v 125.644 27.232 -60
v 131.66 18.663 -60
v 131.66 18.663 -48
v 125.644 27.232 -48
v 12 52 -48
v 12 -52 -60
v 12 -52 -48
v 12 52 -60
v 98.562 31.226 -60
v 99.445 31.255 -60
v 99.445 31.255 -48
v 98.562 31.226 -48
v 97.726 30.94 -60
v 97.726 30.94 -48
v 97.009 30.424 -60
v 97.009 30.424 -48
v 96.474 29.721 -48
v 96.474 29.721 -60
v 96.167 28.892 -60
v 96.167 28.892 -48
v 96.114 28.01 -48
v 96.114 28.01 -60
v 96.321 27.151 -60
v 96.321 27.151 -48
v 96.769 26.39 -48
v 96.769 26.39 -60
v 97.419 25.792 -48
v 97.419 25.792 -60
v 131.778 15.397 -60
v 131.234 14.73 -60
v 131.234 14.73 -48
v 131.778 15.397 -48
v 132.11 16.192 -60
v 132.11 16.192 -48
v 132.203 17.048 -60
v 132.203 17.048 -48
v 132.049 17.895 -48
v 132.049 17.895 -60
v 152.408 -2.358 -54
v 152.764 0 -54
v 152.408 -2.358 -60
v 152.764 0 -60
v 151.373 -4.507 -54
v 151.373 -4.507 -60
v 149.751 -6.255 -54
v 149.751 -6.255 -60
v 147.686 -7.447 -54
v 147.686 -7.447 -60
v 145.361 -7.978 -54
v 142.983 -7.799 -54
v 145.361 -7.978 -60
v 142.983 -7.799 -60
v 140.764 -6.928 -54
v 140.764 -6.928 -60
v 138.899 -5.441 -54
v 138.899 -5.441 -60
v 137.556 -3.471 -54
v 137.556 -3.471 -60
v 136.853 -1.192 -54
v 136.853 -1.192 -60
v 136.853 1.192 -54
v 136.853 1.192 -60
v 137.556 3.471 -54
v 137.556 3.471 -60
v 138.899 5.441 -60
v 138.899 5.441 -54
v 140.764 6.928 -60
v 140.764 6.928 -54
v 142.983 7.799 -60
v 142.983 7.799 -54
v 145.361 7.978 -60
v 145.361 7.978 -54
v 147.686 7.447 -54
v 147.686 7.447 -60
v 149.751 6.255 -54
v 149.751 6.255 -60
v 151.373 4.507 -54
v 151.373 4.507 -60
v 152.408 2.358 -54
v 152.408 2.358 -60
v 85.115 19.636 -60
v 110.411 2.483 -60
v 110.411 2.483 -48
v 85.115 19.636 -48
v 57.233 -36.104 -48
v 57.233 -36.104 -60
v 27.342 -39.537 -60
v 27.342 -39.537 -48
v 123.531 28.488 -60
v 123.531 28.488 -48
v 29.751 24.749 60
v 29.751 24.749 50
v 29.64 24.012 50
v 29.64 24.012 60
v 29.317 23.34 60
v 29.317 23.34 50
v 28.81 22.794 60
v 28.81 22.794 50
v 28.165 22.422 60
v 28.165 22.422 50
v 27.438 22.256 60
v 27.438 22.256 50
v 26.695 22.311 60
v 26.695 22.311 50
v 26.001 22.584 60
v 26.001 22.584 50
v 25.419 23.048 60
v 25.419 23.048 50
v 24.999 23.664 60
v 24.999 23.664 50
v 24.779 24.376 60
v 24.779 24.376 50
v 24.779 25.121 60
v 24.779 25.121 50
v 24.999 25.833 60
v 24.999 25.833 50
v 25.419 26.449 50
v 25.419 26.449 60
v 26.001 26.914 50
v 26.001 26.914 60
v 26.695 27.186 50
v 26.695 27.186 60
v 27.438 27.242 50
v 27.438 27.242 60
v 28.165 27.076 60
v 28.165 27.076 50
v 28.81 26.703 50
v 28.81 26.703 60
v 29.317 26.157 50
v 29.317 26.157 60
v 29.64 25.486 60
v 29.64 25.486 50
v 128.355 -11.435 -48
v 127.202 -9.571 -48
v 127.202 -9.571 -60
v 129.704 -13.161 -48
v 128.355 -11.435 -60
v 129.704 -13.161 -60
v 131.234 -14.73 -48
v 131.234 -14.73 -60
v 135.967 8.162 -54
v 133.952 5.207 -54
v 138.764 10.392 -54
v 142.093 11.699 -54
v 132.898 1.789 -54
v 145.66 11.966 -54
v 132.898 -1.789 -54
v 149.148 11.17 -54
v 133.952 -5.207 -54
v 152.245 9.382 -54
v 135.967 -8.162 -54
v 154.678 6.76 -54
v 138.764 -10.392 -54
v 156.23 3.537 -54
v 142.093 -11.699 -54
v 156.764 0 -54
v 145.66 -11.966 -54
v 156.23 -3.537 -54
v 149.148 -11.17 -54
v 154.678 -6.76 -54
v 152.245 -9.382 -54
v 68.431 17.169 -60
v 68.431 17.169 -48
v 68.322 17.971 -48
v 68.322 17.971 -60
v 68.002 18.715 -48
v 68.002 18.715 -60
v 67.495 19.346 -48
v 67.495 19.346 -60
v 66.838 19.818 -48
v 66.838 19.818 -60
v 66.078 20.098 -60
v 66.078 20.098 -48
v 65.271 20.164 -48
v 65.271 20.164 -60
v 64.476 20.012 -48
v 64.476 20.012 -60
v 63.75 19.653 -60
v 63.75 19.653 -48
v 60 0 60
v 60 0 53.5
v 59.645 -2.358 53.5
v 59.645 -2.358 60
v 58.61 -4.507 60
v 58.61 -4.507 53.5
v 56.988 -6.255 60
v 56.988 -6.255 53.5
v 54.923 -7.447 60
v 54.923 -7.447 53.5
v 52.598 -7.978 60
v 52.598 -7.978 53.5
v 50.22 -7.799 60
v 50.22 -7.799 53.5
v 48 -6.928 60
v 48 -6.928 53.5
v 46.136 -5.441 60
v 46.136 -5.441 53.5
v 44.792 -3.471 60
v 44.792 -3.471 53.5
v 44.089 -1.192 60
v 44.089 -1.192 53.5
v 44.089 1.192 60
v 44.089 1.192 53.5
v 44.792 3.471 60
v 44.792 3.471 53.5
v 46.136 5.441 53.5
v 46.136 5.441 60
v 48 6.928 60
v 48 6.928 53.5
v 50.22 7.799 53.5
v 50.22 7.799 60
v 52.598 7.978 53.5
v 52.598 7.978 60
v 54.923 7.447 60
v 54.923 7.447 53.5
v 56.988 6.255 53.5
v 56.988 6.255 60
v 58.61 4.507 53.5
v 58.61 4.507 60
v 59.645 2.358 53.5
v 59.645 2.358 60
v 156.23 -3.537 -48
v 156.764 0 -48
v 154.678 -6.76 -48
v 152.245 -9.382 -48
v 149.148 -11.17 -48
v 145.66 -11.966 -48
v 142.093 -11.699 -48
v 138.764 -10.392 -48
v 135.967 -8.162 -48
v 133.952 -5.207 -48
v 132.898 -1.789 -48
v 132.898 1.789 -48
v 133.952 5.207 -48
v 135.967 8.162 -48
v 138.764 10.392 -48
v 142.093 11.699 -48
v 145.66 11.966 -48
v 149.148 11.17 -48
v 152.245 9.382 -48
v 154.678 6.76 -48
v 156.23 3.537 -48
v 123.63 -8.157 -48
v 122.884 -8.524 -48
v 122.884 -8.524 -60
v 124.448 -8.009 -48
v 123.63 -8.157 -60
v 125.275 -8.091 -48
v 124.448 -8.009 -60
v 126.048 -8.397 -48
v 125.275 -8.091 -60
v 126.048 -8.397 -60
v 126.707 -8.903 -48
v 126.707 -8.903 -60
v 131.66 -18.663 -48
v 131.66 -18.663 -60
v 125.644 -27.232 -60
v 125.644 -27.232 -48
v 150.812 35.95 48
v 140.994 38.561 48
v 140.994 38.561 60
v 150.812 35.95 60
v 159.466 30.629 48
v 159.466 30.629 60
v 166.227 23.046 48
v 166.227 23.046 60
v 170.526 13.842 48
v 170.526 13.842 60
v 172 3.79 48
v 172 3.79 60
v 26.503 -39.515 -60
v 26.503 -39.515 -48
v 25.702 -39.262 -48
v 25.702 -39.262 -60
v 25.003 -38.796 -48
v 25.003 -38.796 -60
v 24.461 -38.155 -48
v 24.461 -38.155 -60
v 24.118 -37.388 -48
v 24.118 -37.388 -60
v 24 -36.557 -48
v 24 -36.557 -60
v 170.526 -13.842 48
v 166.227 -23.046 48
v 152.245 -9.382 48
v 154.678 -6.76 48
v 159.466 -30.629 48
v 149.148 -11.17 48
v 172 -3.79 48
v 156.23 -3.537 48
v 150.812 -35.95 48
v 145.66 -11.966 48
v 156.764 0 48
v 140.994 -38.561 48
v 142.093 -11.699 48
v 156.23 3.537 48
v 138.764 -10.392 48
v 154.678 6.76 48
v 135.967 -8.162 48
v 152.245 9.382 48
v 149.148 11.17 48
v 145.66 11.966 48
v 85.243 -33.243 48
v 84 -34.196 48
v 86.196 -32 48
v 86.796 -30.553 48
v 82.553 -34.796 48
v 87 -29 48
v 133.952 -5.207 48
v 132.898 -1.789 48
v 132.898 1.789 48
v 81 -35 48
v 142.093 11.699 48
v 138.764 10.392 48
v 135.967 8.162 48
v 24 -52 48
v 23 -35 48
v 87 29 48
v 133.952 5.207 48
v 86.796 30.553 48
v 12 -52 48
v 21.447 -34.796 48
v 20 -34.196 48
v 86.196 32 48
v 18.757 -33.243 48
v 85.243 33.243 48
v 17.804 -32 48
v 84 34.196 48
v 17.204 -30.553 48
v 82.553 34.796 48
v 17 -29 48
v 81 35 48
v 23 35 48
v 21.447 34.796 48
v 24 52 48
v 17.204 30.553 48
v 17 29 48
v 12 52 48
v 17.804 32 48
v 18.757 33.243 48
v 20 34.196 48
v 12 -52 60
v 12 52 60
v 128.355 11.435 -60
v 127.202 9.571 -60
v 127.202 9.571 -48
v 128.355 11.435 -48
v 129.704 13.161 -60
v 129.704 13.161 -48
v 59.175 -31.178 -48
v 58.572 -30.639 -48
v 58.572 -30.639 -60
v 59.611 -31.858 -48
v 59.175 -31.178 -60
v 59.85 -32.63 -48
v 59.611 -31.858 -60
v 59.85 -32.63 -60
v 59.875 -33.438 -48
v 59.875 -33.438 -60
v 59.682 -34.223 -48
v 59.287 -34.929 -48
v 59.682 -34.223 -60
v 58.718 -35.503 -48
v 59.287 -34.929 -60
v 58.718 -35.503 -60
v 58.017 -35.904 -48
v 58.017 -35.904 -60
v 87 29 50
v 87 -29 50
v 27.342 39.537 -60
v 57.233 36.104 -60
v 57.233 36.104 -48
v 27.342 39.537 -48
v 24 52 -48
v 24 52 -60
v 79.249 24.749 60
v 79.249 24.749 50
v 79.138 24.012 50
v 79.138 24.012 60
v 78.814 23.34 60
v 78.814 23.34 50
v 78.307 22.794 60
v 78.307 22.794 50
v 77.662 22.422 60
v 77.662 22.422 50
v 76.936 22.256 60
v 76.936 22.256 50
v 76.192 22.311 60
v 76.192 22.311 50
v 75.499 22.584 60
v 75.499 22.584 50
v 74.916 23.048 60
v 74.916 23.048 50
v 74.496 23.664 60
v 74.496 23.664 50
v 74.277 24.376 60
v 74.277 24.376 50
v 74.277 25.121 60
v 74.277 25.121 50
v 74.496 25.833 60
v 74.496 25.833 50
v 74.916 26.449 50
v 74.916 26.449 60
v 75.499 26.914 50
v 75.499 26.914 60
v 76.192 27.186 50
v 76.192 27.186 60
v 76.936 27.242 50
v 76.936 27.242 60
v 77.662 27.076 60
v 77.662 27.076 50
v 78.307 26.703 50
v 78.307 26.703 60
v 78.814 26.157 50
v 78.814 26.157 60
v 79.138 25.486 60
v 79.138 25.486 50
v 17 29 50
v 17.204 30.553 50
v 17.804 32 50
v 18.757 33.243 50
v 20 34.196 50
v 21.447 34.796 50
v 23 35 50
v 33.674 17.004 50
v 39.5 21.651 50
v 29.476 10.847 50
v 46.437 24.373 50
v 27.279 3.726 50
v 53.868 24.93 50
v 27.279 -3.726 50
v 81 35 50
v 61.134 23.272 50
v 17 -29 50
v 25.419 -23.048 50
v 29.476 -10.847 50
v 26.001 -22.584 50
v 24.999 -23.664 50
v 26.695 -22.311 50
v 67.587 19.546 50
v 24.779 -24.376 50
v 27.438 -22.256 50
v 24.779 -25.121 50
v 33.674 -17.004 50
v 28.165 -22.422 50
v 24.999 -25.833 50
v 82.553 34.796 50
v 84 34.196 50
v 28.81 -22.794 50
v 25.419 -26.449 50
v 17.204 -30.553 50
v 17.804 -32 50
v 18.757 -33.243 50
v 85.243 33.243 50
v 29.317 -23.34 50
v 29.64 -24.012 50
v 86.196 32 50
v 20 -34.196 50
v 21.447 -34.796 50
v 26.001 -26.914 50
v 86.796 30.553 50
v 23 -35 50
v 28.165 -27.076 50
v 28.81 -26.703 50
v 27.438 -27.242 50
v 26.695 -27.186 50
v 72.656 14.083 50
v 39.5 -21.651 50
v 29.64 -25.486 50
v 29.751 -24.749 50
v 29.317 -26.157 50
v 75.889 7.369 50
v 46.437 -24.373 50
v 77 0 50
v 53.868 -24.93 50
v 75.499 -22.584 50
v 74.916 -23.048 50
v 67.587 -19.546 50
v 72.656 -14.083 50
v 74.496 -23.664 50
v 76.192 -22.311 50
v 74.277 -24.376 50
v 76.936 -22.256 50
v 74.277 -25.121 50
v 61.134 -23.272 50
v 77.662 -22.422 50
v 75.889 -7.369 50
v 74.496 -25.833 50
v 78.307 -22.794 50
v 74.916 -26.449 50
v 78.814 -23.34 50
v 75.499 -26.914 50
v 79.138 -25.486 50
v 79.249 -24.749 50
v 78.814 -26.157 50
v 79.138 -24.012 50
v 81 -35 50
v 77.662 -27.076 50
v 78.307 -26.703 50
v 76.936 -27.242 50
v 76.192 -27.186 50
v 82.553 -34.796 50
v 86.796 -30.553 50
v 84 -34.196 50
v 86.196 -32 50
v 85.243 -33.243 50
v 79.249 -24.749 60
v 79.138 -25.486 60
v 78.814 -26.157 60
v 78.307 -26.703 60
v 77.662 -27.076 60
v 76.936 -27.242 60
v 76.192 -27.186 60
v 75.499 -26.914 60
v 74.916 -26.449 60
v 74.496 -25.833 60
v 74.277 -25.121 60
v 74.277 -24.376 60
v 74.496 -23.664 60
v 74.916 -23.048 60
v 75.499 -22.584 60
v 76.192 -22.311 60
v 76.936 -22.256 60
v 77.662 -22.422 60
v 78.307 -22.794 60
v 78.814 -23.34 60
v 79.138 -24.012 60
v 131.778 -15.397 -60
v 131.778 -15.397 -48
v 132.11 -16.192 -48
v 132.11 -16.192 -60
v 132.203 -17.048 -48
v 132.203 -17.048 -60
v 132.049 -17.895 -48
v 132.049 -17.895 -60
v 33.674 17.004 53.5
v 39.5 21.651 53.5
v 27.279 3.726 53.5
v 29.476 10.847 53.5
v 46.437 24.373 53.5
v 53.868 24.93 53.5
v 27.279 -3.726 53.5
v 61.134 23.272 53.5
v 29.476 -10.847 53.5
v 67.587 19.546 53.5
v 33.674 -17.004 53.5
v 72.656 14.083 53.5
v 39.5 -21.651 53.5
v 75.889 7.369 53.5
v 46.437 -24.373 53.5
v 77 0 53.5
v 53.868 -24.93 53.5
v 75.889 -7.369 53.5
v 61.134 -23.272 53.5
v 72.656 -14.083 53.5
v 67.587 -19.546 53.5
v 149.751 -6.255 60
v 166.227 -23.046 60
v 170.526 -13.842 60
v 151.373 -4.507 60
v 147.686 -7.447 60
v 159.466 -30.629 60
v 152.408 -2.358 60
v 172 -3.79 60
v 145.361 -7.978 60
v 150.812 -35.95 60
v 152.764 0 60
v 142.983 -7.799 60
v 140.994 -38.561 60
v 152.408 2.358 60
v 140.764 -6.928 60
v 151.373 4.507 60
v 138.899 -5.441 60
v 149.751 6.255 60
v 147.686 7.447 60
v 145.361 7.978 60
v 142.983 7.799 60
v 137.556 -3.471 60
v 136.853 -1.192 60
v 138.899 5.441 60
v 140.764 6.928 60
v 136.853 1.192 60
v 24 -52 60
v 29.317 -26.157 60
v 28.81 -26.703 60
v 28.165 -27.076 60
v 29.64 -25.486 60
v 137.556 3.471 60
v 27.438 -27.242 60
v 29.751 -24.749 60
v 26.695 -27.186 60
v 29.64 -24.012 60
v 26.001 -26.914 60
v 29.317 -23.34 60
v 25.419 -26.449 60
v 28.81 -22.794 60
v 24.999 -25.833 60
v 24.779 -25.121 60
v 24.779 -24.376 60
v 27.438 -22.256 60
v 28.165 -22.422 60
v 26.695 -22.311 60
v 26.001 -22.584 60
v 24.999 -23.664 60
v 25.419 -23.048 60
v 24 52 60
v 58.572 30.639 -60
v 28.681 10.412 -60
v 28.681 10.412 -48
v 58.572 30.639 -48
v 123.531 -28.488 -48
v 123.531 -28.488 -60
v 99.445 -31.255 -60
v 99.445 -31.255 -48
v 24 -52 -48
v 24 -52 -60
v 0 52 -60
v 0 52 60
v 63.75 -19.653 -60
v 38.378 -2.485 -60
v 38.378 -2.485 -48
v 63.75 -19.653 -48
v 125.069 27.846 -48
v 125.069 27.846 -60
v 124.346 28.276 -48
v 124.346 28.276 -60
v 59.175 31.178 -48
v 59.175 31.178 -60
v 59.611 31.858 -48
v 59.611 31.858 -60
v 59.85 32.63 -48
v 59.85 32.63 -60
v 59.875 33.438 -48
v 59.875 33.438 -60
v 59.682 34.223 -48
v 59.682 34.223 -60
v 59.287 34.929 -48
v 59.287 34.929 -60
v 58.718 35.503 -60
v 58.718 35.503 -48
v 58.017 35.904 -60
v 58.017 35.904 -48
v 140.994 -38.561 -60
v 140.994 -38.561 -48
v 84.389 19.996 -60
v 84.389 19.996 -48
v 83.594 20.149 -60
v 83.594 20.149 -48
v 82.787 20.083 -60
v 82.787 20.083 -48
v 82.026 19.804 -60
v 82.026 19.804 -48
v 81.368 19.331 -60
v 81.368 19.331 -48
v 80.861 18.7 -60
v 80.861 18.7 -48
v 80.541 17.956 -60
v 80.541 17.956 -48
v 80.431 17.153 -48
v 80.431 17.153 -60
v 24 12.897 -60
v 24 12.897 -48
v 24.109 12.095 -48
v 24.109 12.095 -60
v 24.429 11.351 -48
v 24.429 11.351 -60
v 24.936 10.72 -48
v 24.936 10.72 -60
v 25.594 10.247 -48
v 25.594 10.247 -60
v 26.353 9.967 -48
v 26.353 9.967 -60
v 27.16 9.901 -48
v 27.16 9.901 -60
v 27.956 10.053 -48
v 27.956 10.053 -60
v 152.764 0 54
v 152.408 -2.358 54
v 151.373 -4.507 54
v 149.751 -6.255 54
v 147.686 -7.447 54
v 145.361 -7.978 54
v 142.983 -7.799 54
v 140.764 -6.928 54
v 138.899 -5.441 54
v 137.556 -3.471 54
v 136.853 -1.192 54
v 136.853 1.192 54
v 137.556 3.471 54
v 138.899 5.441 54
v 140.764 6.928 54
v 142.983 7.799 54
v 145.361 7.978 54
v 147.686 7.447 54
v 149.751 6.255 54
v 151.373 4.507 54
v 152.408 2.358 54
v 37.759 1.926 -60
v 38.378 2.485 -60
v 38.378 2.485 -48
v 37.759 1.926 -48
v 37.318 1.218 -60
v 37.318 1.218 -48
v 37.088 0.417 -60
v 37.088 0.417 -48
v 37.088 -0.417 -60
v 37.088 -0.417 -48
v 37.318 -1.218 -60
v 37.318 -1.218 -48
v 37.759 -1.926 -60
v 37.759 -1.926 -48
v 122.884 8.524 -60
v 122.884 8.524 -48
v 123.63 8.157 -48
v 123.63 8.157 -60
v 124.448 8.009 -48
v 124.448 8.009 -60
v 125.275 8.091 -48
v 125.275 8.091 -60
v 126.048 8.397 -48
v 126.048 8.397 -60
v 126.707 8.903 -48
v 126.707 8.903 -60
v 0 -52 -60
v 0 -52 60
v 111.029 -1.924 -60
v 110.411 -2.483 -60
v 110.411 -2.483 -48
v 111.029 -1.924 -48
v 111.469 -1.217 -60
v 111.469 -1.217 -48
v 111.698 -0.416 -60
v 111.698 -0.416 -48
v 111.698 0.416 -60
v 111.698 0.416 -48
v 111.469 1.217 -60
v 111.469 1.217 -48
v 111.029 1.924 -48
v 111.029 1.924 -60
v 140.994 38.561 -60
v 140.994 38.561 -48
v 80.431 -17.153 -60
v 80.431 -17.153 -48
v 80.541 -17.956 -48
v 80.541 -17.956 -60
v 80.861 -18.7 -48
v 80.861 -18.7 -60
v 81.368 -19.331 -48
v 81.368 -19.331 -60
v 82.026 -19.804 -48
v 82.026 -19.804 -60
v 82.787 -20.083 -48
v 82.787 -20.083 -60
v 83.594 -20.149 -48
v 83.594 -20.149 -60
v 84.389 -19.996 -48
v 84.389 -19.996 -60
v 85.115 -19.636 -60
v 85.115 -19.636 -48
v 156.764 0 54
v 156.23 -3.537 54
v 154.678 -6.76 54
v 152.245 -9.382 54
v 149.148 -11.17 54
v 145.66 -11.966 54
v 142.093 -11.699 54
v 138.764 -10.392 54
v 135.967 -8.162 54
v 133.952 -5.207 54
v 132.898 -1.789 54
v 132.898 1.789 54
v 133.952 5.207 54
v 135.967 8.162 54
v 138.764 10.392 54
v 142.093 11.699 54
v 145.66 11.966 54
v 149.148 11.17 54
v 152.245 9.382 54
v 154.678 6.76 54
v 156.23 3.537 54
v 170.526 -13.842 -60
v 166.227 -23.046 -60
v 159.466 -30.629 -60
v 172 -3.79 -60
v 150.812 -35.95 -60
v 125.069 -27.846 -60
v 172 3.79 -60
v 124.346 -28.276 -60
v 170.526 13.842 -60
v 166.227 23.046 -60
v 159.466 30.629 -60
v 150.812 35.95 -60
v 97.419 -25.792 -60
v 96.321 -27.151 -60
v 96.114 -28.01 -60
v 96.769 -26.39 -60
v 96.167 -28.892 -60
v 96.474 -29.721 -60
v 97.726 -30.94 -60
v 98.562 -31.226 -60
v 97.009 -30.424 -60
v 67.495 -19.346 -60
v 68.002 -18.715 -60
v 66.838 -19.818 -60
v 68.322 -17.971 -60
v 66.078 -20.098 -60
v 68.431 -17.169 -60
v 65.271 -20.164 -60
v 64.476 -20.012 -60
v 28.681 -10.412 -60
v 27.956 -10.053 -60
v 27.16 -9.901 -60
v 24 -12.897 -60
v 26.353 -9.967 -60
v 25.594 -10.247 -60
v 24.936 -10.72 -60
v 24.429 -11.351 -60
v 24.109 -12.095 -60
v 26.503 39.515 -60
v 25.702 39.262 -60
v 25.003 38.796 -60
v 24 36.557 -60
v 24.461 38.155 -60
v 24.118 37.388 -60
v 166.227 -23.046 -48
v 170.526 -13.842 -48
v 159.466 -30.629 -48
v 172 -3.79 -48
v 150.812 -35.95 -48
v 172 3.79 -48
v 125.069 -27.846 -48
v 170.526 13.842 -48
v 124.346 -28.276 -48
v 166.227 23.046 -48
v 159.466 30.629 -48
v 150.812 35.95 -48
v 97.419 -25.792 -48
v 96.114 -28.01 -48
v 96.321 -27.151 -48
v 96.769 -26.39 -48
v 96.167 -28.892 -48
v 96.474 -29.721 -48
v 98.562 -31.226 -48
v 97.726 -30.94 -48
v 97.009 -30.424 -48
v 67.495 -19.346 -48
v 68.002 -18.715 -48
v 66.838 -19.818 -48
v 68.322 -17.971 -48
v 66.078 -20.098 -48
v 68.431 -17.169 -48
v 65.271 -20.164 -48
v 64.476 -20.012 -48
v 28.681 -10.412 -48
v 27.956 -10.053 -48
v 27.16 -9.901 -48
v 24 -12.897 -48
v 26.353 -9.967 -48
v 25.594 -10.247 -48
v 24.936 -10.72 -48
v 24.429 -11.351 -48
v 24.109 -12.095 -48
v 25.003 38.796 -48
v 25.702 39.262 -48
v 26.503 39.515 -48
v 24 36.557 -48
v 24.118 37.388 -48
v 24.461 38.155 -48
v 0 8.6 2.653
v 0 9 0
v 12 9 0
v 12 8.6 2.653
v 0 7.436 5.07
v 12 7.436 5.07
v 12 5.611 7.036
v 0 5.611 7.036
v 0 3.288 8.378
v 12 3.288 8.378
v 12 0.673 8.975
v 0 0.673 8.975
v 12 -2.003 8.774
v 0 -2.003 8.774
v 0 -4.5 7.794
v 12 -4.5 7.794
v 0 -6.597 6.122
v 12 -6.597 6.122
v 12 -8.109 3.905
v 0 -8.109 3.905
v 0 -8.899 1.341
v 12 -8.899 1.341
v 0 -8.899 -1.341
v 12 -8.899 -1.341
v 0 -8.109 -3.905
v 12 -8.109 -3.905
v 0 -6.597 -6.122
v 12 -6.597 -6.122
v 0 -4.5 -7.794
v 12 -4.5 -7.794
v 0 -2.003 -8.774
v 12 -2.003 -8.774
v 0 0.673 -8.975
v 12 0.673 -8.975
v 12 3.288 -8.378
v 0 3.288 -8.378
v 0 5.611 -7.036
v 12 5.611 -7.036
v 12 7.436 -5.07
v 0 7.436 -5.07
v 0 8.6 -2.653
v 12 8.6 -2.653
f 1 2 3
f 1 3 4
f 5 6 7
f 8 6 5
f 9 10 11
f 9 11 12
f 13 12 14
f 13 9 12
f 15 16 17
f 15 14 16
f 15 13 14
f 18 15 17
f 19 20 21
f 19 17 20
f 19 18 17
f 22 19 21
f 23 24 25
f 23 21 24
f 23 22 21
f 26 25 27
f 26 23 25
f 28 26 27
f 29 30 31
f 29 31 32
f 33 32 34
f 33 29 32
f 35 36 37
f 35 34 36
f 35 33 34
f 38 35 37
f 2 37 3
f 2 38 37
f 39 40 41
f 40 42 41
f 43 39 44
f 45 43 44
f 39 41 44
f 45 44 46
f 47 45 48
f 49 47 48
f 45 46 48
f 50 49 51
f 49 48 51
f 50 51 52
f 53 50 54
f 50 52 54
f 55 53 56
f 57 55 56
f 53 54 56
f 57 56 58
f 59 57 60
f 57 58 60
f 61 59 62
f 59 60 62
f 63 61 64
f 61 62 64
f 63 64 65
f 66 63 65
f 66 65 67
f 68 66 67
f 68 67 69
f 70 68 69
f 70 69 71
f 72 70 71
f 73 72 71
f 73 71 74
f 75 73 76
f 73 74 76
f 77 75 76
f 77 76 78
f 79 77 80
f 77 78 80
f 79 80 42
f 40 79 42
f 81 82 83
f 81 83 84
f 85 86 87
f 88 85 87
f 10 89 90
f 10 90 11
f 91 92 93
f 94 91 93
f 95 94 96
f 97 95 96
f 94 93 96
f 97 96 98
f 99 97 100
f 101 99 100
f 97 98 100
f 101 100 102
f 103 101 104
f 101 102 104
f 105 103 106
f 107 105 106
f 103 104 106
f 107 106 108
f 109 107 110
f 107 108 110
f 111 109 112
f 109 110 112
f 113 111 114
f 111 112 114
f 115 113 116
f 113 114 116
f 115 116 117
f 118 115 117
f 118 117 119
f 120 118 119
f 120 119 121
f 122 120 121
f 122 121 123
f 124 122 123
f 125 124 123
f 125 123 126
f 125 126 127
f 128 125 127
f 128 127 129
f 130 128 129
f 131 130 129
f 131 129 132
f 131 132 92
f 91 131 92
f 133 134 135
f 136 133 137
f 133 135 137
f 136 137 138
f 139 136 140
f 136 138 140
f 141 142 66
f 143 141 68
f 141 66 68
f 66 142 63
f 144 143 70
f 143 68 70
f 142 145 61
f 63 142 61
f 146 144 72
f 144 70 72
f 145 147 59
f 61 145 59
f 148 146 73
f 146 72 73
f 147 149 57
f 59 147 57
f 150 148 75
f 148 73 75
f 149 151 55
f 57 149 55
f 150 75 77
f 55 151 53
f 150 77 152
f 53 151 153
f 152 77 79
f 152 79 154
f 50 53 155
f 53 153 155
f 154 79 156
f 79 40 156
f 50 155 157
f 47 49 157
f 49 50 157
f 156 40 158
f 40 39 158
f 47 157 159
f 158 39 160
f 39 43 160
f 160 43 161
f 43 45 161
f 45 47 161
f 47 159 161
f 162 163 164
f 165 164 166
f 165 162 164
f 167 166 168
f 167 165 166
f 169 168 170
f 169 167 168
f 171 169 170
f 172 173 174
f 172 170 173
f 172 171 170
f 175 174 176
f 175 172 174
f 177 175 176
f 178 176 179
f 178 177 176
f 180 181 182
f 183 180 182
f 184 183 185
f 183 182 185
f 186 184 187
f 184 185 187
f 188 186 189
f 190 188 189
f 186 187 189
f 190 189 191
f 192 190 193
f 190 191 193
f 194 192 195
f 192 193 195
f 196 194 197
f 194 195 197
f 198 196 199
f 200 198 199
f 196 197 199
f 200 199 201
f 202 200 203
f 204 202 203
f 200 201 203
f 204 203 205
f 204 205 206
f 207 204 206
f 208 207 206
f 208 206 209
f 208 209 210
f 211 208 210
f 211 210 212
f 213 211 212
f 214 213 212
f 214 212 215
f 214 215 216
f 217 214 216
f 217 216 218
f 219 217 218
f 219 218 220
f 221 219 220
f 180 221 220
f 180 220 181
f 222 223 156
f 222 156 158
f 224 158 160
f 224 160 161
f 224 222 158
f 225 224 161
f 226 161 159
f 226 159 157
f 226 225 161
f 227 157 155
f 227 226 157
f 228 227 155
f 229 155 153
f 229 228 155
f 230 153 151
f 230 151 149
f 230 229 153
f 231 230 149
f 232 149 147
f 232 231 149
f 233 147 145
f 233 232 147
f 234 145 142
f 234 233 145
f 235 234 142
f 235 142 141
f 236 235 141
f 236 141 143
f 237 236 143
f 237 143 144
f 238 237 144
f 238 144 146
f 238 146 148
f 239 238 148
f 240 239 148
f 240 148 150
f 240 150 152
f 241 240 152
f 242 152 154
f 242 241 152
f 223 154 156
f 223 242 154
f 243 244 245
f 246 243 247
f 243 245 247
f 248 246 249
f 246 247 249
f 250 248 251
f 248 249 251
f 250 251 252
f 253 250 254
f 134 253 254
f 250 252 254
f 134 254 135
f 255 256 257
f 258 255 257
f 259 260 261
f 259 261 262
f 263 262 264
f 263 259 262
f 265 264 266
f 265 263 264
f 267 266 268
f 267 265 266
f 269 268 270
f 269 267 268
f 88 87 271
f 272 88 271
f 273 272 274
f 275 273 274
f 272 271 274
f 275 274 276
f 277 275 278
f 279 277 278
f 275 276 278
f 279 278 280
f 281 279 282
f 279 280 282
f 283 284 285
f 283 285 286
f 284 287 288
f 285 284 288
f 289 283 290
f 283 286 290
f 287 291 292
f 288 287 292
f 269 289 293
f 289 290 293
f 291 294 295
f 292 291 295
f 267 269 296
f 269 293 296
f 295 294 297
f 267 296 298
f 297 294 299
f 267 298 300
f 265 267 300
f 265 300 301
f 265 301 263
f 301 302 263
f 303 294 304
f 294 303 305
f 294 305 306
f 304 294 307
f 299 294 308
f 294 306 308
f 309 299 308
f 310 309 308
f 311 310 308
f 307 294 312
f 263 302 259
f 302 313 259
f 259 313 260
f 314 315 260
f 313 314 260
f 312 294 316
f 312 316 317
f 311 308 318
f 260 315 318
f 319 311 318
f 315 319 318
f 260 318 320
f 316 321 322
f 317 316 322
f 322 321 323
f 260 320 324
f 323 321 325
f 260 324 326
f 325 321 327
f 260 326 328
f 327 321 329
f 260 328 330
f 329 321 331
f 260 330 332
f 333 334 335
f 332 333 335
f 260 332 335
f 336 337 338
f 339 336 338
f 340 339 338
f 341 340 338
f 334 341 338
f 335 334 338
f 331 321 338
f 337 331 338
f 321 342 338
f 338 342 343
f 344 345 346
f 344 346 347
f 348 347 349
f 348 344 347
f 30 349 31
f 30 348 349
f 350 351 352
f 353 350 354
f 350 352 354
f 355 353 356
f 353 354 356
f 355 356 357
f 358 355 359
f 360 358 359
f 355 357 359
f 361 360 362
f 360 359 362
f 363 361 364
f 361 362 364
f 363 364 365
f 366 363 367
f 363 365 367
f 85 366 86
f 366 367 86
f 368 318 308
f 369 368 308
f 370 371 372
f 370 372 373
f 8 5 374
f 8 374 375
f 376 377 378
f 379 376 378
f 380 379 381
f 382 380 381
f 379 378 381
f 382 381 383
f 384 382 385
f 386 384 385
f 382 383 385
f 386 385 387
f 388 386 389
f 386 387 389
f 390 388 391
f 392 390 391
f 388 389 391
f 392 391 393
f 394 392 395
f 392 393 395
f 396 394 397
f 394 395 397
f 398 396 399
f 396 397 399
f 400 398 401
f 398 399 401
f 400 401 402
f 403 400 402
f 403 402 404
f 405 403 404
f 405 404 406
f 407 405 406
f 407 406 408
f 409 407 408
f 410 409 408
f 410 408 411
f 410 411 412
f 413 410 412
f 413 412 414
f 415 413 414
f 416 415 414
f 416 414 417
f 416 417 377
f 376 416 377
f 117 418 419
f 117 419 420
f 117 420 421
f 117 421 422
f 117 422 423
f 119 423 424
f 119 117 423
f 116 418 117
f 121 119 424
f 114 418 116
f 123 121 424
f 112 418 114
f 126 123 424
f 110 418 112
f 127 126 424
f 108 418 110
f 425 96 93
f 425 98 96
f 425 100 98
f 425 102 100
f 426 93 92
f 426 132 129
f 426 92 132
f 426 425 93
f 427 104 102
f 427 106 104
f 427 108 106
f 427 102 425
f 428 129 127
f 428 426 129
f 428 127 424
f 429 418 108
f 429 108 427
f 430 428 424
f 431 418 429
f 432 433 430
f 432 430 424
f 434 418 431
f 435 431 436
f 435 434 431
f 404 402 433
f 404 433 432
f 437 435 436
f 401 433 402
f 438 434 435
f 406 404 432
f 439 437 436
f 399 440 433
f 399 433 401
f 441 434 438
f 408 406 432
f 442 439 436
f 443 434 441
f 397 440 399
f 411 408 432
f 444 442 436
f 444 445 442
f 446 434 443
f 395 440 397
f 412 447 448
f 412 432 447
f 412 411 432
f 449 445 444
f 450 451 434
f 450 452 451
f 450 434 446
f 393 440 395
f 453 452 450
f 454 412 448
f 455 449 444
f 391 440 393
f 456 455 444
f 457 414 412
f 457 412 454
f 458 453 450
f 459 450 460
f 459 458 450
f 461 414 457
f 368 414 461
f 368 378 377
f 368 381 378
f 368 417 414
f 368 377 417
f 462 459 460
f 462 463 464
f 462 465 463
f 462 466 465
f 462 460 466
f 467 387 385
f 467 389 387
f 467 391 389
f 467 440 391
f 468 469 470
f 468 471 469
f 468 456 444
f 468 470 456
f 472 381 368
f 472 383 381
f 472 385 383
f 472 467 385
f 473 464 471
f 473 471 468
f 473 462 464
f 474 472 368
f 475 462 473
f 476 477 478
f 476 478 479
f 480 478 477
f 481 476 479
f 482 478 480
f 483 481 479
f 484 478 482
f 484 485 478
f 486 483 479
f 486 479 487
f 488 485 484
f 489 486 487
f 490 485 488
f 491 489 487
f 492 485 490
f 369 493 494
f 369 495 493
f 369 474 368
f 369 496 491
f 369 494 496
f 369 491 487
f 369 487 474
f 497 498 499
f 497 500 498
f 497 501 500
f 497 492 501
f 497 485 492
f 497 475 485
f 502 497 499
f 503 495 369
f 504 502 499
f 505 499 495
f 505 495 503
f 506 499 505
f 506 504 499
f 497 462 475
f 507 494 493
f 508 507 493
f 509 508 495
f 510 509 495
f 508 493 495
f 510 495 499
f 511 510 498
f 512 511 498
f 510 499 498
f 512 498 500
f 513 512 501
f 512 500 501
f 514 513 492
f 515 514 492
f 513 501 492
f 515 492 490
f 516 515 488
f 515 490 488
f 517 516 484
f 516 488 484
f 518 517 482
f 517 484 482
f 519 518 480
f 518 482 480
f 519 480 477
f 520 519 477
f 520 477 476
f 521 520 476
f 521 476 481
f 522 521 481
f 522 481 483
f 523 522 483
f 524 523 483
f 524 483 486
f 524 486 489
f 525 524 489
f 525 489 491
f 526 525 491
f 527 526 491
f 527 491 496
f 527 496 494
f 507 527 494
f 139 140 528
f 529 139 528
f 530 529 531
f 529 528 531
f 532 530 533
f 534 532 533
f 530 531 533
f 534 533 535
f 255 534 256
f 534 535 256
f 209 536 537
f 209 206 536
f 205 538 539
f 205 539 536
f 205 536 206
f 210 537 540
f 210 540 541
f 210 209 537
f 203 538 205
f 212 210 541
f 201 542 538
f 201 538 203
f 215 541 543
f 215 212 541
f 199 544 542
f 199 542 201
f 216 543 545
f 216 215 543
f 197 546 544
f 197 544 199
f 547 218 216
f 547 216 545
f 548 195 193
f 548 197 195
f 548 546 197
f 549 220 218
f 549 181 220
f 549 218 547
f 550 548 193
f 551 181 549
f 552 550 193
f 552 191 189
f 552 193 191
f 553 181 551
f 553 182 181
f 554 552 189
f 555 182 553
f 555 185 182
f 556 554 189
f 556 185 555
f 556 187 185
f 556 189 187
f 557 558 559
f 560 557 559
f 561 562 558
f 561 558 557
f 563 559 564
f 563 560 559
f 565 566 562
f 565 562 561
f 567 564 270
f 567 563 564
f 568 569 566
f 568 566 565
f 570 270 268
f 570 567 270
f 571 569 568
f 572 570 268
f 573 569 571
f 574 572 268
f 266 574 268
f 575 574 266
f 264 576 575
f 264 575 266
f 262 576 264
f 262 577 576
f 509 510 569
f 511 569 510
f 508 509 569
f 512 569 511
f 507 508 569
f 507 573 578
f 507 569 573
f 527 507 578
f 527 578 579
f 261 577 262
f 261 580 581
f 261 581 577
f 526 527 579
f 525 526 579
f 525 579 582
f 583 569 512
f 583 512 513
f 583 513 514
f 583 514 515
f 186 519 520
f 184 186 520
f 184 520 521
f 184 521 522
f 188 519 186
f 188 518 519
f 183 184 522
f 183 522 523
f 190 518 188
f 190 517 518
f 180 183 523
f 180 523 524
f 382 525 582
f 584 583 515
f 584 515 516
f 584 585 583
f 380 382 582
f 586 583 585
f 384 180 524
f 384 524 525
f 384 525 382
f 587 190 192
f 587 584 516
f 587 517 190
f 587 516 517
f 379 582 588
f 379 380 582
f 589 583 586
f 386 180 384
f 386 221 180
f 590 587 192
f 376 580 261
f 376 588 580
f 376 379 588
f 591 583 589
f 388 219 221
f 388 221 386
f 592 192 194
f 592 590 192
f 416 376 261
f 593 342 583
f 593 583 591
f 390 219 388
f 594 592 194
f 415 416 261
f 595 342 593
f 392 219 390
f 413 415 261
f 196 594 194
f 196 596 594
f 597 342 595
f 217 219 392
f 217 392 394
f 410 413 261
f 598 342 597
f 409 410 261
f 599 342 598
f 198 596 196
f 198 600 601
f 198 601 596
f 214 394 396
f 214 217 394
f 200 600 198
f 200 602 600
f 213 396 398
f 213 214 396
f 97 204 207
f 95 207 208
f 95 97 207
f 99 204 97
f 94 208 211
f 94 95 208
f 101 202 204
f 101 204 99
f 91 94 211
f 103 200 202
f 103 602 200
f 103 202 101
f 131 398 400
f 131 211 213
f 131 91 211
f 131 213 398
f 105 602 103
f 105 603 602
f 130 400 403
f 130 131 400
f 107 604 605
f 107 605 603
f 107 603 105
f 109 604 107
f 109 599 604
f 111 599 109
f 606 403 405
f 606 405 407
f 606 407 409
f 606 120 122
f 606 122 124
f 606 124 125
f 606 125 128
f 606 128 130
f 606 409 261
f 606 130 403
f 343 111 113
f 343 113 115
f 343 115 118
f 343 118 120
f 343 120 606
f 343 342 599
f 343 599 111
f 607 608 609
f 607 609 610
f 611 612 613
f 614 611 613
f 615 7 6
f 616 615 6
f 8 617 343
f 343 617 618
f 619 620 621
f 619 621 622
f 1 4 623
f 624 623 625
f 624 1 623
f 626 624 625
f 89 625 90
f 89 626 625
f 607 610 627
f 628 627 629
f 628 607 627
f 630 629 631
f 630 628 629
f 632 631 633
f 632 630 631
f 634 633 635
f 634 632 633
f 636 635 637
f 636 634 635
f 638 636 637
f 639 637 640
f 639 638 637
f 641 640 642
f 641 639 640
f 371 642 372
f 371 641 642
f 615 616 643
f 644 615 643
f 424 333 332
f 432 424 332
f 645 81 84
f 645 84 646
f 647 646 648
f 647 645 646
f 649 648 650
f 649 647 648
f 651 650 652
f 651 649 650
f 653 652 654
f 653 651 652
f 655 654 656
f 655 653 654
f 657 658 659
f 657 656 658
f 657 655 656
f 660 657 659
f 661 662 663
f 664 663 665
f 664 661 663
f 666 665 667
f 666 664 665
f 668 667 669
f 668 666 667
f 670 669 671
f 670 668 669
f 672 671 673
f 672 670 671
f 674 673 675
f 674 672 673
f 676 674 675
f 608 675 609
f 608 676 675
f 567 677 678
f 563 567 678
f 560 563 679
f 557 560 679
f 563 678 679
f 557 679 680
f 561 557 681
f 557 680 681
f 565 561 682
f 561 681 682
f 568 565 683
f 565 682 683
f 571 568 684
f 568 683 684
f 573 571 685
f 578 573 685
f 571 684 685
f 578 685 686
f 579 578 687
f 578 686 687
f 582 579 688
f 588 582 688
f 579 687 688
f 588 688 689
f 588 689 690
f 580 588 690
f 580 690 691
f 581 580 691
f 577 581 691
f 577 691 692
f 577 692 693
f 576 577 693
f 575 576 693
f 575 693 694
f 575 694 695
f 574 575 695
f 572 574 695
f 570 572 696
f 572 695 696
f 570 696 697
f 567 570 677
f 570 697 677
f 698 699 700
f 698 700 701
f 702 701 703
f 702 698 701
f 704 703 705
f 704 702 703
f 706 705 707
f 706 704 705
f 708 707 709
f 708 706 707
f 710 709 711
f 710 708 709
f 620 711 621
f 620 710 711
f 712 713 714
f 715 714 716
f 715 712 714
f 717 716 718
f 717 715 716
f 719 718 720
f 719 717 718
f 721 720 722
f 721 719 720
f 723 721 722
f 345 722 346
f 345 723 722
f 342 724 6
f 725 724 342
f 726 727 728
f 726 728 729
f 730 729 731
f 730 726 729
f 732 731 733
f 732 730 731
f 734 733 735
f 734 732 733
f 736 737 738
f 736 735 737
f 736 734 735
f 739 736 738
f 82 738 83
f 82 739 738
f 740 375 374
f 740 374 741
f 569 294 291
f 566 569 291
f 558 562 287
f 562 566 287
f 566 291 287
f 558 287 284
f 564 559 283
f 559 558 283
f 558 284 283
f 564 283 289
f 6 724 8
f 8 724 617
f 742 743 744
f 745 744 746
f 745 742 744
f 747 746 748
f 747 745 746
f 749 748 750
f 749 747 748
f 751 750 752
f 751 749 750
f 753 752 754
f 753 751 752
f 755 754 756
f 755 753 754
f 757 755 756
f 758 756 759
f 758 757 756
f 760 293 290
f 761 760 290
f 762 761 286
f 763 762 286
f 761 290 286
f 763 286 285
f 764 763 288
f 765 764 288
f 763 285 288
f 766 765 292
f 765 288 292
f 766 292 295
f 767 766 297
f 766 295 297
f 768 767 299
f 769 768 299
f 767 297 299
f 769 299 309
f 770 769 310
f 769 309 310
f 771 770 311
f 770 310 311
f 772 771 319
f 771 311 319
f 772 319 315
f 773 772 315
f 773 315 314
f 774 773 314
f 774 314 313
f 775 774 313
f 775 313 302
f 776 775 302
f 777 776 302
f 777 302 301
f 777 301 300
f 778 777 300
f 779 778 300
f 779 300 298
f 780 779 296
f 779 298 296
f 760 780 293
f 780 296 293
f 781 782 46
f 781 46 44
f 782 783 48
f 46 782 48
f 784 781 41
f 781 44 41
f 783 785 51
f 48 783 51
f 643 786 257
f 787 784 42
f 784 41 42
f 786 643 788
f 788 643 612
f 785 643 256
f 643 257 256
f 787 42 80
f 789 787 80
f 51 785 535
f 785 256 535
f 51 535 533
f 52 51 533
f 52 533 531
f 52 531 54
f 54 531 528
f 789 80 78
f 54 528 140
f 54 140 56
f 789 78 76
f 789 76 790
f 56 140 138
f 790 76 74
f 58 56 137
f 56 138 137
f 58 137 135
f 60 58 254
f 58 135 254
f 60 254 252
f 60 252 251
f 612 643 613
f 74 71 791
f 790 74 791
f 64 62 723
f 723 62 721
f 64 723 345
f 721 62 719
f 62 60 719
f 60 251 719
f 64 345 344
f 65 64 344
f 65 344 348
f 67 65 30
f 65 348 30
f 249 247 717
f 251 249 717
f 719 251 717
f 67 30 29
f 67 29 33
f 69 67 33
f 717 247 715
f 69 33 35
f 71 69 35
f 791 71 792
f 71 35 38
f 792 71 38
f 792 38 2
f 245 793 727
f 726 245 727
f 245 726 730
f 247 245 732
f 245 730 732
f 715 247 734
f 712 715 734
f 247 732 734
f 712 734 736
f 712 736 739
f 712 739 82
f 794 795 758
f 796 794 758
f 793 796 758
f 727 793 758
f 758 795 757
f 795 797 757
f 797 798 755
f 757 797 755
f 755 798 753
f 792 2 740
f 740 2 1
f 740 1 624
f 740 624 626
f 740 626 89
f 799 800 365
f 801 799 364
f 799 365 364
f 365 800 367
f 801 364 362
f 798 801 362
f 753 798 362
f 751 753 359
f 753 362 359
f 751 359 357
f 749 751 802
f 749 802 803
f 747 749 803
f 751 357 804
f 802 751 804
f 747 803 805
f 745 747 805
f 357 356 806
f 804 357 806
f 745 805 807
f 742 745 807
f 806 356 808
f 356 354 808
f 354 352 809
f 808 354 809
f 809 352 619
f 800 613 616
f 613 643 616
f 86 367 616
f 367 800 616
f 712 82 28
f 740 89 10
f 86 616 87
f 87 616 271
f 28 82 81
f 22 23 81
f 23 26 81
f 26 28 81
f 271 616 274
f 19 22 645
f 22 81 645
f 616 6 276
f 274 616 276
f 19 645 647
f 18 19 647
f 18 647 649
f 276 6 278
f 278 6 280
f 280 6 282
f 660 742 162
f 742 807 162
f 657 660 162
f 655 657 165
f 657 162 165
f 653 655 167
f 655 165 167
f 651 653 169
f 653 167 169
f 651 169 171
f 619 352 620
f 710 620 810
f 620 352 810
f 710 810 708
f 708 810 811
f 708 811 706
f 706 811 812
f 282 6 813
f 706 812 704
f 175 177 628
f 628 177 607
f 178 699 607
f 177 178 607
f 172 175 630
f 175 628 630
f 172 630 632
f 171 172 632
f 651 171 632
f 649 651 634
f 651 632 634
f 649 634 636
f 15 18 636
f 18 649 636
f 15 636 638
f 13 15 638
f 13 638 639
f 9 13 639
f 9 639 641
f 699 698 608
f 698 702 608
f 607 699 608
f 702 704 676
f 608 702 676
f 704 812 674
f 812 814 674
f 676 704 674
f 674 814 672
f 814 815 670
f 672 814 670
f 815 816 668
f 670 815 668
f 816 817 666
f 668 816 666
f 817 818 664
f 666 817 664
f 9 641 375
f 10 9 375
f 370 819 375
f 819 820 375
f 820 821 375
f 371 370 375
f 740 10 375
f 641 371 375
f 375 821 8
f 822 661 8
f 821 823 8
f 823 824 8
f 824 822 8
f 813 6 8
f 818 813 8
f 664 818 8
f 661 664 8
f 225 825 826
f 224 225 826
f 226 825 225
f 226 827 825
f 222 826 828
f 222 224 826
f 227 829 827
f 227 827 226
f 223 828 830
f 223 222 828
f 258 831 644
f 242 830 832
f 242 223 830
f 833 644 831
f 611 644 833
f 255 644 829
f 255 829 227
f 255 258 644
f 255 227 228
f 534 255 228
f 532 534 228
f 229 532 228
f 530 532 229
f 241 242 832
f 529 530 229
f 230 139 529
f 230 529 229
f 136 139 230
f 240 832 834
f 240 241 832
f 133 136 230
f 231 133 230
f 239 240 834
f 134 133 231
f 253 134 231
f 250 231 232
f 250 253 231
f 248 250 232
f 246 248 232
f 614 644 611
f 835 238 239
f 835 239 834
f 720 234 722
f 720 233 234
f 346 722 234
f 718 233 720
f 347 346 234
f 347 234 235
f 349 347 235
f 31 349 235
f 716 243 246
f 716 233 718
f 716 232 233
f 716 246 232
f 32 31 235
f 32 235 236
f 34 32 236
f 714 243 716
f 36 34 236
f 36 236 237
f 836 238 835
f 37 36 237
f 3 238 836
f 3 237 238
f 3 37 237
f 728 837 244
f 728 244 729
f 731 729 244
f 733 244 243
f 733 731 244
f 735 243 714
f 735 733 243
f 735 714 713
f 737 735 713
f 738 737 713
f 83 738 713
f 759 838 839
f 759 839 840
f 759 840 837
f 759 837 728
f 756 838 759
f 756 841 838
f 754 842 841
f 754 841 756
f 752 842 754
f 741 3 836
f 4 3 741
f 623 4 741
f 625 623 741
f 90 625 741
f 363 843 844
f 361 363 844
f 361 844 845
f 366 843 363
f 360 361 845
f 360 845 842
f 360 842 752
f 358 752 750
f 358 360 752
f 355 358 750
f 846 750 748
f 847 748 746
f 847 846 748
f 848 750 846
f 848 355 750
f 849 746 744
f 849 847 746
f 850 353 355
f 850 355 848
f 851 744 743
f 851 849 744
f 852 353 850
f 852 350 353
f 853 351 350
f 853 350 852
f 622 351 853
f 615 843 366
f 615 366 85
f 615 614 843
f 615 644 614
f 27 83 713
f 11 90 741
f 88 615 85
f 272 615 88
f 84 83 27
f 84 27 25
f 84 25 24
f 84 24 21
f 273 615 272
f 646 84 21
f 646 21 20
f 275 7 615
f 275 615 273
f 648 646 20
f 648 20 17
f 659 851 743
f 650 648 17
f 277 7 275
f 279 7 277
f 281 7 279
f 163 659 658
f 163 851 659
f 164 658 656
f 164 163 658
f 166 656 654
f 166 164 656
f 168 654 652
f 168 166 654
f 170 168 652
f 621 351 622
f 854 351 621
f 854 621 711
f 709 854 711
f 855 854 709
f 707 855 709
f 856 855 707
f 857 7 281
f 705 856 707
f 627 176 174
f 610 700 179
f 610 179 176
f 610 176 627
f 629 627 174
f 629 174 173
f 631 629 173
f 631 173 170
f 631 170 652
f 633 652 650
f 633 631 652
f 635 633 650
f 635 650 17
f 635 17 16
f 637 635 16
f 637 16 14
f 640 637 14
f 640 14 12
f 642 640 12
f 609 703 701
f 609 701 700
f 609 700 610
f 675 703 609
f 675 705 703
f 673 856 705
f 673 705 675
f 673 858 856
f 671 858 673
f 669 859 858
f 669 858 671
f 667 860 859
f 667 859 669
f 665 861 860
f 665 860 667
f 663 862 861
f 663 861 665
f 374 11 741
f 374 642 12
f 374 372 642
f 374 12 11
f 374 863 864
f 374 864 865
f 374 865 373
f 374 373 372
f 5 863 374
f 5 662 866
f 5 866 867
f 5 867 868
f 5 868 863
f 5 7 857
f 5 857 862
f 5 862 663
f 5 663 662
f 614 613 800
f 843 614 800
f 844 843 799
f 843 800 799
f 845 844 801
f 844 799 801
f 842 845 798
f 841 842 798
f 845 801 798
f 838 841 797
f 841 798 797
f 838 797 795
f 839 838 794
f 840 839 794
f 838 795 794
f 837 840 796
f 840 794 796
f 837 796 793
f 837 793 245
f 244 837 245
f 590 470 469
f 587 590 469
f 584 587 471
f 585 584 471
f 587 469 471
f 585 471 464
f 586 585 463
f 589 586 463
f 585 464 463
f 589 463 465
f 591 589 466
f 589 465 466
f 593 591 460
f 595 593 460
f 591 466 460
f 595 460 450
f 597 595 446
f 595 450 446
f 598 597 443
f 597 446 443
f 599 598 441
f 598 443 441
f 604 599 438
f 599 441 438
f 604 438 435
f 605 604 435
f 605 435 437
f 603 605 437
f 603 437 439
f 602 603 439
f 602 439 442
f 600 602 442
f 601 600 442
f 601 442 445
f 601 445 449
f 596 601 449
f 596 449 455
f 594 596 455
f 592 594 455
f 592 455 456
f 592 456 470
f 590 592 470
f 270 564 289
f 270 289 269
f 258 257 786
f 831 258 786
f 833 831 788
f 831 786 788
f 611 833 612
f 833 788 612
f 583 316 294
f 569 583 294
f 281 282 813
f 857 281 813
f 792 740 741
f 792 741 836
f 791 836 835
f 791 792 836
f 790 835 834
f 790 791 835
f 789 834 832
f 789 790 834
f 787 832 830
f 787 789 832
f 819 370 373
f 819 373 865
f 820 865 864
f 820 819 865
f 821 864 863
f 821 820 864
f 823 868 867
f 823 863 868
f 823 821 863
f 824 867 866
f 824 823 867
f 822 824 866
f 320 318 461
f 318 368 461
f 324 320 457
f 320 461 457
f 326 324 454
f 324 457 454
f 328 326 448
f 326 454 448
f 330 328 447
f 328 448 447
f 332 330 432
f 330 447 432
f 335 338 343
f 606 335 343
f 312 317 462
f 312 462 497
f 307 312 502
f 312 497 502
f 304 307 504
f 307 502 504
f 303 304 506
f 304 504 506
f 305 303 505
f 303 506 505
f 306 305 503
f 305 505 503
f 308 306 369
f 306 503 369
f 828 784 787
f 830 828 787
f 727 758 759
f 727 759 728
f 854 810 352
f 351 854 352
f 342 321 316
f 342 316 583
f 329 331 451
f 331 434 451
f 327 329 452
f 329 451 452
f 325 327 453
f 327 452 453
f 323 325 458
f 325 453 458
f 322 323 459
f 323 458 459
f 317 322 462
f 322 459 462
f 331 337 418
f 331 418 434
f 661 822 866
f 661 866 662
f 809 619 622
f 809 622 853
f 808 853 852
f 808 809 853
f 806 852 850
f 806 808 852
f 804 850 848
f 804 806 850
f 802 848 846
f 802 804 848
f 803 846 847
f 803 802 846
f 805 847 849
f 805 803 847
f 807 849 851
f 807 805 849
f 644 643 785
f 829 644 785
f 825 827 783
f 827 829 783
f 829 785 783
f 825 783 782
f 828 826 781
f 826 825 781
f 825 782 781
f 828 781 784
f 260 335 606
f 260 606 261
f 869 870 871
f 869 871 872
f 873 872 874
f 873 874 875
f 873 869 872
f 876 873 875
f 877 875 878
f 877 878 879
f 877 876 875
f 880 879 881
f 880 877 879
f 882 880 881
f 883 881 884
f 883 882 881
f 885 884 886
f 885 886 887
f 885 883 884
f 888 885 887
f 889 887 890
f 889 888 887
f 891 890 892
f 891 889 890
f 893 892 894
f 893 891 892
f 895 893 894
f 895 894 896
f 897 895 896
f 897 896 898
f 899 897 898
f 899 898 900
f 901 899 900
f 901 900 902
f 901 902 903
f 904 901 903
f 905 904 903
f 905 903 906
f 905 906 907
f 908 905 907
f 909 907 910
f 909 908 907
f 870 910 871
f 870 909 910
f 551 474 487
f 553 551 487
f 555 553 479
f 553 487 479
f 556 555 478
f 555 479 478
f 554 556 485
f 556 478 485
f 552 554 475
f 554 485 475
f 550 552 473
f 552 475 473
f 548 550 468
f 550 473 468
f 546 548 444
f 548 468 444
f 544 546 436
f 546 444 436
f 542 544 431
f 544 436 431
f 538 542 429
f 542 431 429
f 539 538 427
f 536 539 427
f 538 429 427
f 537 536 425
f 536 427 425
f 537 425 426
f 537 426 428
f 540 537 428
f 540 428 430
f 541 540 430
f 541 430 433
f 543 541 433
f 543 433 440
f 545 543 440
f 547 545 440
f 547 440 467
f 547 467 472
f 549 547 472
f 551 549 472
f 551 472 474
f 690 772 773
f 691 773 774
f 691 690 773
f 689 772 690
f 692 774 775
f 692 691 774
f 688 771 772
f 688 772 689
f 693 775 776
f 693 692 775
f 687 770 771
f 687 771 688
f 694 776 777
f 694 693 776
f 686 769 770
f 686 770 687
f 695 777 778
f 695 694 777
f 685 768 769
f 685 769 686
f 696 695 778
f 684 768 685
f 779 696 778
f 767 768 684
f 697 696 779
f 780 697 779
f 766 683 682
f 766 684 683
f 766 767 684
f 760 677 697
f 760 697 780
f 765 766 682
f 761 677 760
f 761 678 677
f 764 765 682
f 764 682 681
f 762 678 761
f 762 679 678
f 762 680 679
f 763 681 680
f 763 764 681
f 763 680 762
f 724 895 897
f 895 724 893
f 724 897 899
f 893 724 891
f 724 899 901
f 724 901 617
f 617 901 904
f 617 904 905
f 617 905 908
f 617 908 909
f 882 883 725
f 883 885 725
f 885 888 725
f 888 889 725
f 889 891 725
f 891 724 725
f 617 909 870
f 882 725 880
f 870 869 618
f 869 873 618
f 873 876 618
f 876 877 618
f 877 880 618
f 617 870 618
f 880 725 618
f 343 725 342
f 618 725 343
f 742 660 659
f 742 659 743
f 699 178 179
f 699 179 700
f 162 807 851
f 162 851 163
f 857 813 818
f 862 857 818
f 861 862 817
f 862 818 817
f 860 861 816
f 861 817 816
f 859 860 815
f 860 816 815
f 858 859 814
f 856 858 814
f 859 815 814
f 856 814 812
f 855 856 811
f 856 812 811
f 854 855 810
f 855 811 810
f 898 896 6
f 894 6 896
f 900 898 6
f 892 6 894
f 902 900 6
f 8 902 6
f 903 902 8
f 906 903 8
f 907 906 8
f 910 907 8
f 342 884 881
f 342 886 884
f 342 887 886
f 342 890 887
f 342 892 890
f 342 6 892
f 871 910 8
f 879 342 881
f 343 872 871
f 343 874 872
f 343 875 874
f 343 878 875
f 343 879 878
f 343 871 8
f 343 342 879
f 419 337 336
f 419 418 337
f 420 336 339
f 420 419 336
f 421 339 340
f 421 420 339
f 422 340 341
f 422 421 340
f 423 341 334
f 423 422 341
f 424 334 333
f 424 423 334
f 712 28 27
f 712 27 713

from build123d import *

# Parameters (mm, degrees)
SKETCH1_W               = 104
SKETCH1_H               = 120
SKETCH1_R               = 9
BOSS_EXTRUDE1_DEPTH     = 12
SKETCH2_W               = 104
SKETCH2_H               = 12
BOSS_EXTRUDE3_DEPTH     = 160
SKETCH3_R               = 8
SKETCH3_R_2             = 2.5
CUT_EXTRUDE1_DEPTH      = 20
SKETCH3_3_R             = 25
CUT_EXTRUDE2_DEPTH      = 5.5
SKETCH3_4_W             = 70
SKETCH3_4_H             = 70
CUT_EXTRUDE3_DEPTH      = 2
FILLET1_R               = 6
SKETCH3_5_R             = 8
CUT_EXTRUDE4_DEPTH      = 109
CUT_EXTRUDE4_DEPTH_BACK = 13
SKETCH3_6_R             = 12
SKETCH3_6_R_2           = 8
CUT_EXTRUDE5_DEPTH      = 6
CUT_EXTRUDE6_START      = 96
SKETCH3_7_R             = 12
CUT_EXTRUDE6_DEPTH      = 6
CUT_EXTRUDE7_DEPTH      = 1
CUT_EXTRUDE7_DEPTH_BACK = 121
CUT_EXTRUDE8_DEPTH      = 1
CUT_EXTRUDE8_DEPTH_BACK = 20


with BuildPart() as part:
    # Sketch1 → Boss-Extrude1 (new body)
    with BuildSketch(Plane.YZ):
        Rectangle(SKETCH1_W, SKETCH1_H)
        Circle(SKETCH1_R, mode=Mode.SUBTRACT)
    extrude(amount=BOSS_EXTRUDE1_DEPTH)


with BuildPart() as body_2:
    # Sketch2 → Boss-Extrude3 (new body)
    with BuildSketch(Plane.YZ.offset(12)):
        with Locations((0, 54)):
            Rectangle(SKETCH2_W, SKETCH2_H)
    extrude(amount=BOSS_EXTRUDE3_DEPTH)


with BuildPart() as body_3:
    # Mirror2: mirrored copy
    add(body_2.part.mirror(Plane.XY))


with BuildPart() as body_2_1:
    add(body_2.part)

    # Sketch3 → Cut-Extrude1 (cut)
    with BuildSketch(Plane(origin=(0, 0, 48), x_dir=(1, 0, 0), z_dir=(0, 0, -1))):
        with Locations((52, 0)):
            Circle(SKETCH3_R)
        with Locations((27.251262658, 24.748737342)):
            Circle(SKETCH3_R_2)
        with Locations((76.748737342, 24.748737342)):
            Circle(SKETCH3_R_2)
        with Locations((76.748737342, -24.748737342)):
            Circle(SKETCH3_R_2)
        with Locations((27.251262658, -24.748737342)):
            Circle(SKETCH3_R_2)
    extrude(amount=-CUT_EXTRUDE1_DEPTH, mode=Mode.SUBTRACT)

    # Sketch3<3> → Cut-Extrude2 (cut)
    with BuildSketch(Plane(origin=(0, 0, 48), x_dir=(1, 0, 0), z_dir=(0, 0, -1))):
        with Locations((52, 0)):
            Circle(SKETCH3_3_R)
    extrude(amount=-CUT_EXTRUDE2_DEPTH, mode=Mode.SUBTRACT)

    # Sketch3<4> → Cut-Extrude3 (cut)
    with BuildSketch(Plane(origin=(0, 0, 48), x_dir=(1, 0, 0), z_dir=(0, 0, -1))):
        with Locations((52, 0)):
            Rectangle(SKETCH3_4_W, SKETCH3_4_H)
    extrude(amount=-CUT_EXTRUDE3_DEPTH, mode=Mode.SUBTRACT)

    # Fillet1
    fillet1_edges = [body_2_1.edges().sort_by_distance(p)[0] for p in [
        (17, 35, 49),
        (17, -35, 49),
        (87, -35, 49),
        (87, 35, 49),
    ]]
    fillet(fillet1_edges, radius=FILLET1_R)


with BuildPart() as cut_extrude4_tool:
    # Sketch3<5> → Cut-Extrude4 (new body, two sides)
    with BuildSketch(Plane(origin=(0, 0, 48), x_dir=(1, 0, 0), z_dir=(0, 0, -1))) as cut_extrude4_sk:
        with Locations((144.763523684, 0)):
            Circle(SKETCH3_5_R)
    extrude(amount=CUT_EXTRUDE4_DEPTH)
    extrude(cut_extrude4_sk.sketch, amount=-CUT_EXTRUDE4_DEPTH_BACK)


with BuildPart() as body_2_2:
    add(body_2_1.part)

    # Cut-Extrude4: cut by cut_extrude4_tool
    add(cut_extrude4_tool.part, mode=Mode.SUBTRACT)

    # Sketch3<6> → Cut-Extrude5 (cut)
    with BuildSketch(Plane(origin=(0, 0, 48), x_dir=(1, 0, 0), z_dir=(0, 0, -1))):
        with Locations((144.763523684, 0)):
            Circle(SKETCH3_6_R)
        with Locations((144.763523684, 0)):
            Circle(SKETCH3_6_R_2, mode=Mode.SUBTRACT)
    extrude(amount=-CUT_EXTRUDE5_DEPTH, mode=Mode.SUBTRACT)


with BuildPart() as body_3_1:
    add(body_3.part)

    # Cut-Extrude4: cut by cut_extrude4_tool
    add(cut_extrude4_tool.part, mode=Mode.SUBTRACT)

    # Sketch3<7> → Cut-Extrude6 (cut)
    with BuildSketch(Plane(origin=(0, 0, 48), x_dir=(1, 0, 0), z_dir=(0, 0, -1)).offset(CUT_EXTRUDE6_START)):
        with Locations((144.763523684, 0)):
            Circle(SKETCH3_7_R)
    extrude(amount=CUT_EXTRUDE6_DEPTH, mode=Mode.SUBTRACT)


with BuildPart() as cut_extrude7_tool:
    # Sketch4 → Cut-Extrude7 (new body, two sides)
    with BuildSketch(Plane(origin=(0, 0, -60), x_dir=(1, 0, 0), z_dir=(0, 0, -1))) as cut_extrude7_sk:
        with BuildLine():
            Line((24, 52), (140.994008264, 38.561499051))
            ThreePointArc((140.994008264, 38.561499051), (163.122694054, 27.084013199), (172, 3.790132986))
            Line((172, 3.790132986), (172, 52))
            Line((172, 52), (24, 52))
        make_face()
        with BuildLine():
            Line((24, -52), (140.994008264, -38.561499051))
            ThreePointArc((140.994008264, -38.561499051), (163.122694054, -27.084013199), (172, -3.790132986))
            Line((172, -3.790132986), (172, -52))
            Line((172, -52), (24, -52))
        make_face()
    extrude(amount=CUT_EXTRUDE7_DEPTH)
    extrude(cut_extrude7_sk.sketch, amount=-CUT_EXTRUDE7_DEPTH_BACK)


with BuildPart() as body_2_3:
    add(body_2_2.part)

    # Cut-Extrude7: cut by cut_extrude7_tool
    add(cut_extrude7_tool.part, mode=Mode.SUBTRACT)


with BuildPart() as body_3_2:
    add(body_3_1.part)

    # Cut-Extrude7: cut by cut_extrude7_tool
    add(cut_extrude7_tool.part, mode=Mode.SUBTRACT)

    # Sketch5 → Cut-Extrude8 (cut, two sides)
    with BuildSketch(Plane(origin=(0, 0, -60), x_dir=(1, 0, 0), z_dir=(0, 0, -1))) as cut_extrude8_sk:
        with BuildLine():
            Line((38.378018651, 2.484618931), (63.750146093, 19.653205971))
            ThreePointArc((63.750146093, 19.653205971), (66.83786374, 19.81847477), (68.43141608, 17.168587041))
            Line((68.43141608, 17.168587041), (68.43141608, -17.168587041))
            ThreePointArc((68.43141608, -17.168587041), (66.83786374, -19.81847477), (63.750146093, -19.653205971))
            Line((63.750146093, -19.653205971), (38.378018651, -2.484618931))
            ThreePointArc((38.378018651, -2.484618931), (37.059288638, 0), (38.378018651, 2.484618931))
        make_face()
        with BuildLine():
            Line((85.11512205, 19.636271681), (110.411175563, 2.482968829))
            ThreePointArc((110.411175563, 2.482968829), (111.727469593, 0), (110.411175563, -2.482968829))
            Line((110.411175563, -2.482968829), (85.11512205, -19.636271681))
            ThreePointArc((85.11512205, -19.636271681), (82.026268029, -19.80387995), (80.43141608, -17.153302852))
            Line((80.43141608, -17.153302852), (80.43141608, 17.153302852))
            ThreePointArc((80.43141608, 17.153302852), (82.026268029, 19.80387995), (85.11512205, 19.636271681))
        make_face()
        with BuildLine():
            Line((28.681269987, 10.412252121), (58.572397099, 30.638715934))
            ThreePointArc((58.572397099, 30.638715934), (59.804950819, 33.837219591), (57.233470678, 36.10373767))
            Line((57.233470678, 36.10373767), (27.342343565, 39.537177946))
            ThreePointArc((27.342343565, 39.537177946), (25.003381696, 38.795863203), (24, 36.556775141))
            Line((24, 36.556775141), (24, 12.896871051))
            ThreePointArc((24, 12.896871051), (25.59355234, 10.246983322), (28.681269987, 10.412252121))
        make_face()
        with BuildLine():
            Line((97.419038917, 25.791734264), (122.88439953, 8.523623939))
            ThreePointArc((122.88439953, 8.523623939), (125.275265792, 8.0911298), (127.20229048, 9.570950233))
            ThreePointArc((127.20229048, 9.570950233), (129.005827387, 12.316452712), (131.234448999, 14.729702583))
            ThreePointArc((131.234448999, 14.729702583), (132.187652387, 16.616189766), (131.660366854, 18.662992286))
            Line((131.660366854, 18.662992286), (125.644209857, 27.231880919))
            ThreePointArc((125.644209857, 27.231880919), (124.722362956, 28.086531783), (123.531274365, 28.488449409))
            Line((123.531274365, 28.488449409), (99.445088452, 31.255105899))
            ThreePointArc((99.445088452, 31.255105899), (96.289931227, 29.317813499), (97.419038917, 25.791734264))
        make_face()
        with BuildLine():
            Line((97.419038917, -25.791734264), (122.88439953, -8.523623939))
            ThreePointArc((122.88439953, -8.523623939), (125.275265792, -8.0911298), (127.20229048, -9.570950233))
            ThreePointArc((127.20229048, -9.570950233), (129.005827387, -12.316452712), (131.234448999, -14.729702583))
            ThreePointArc((131.234448999, -14.729702583), (132.187652387, -16.616189766), (131.660366854, -18.662992286))
            Line((131.660366854, -18.662992286), (125.644209857, -27.231880919))
            ThreePointArc((125.644209857, -27.231880919), (124.722362956, -28.086531783), (123.531274365, -28.488449409))
            Line((123.531274365, -28.488449409), (99.445088452, -31.255105899))
            ThreePointArc((99.445088452, -31.255105899), (96.289931227, -29.317813499), (97.419038917, -25.791734264))
        make_face()
        with BuildLine():
            Line((28.681269987, -10.412252121), (58.572397099, -30.638715934))
            ThreePointArc((58.572397099, -30.638715934), (59.804950819, -33.837219591), (57.233470678, -36.10373767))
            Line((57.233470678, -36.10373767), (27.342343565, -39.537177946))
            ThreePointArc((27.342343565, -39.537177946), (25.003381696, -38.795863203), (24, -36.556775141))
            Line((24, -36.556775141), (24, -12.896871051))
            ThreePointArc((24, -12.896871051), (25.59355234, -10.246983322), (28.681269987, -10.412252121))
        make_face()
    extrude(amount=CUT_EXTRUDE8_DEPTH, mode=Mode.SUBTRACT)
    extrude(cut_extrude8_sk.sketch, amount=-CUT_EXTRUDE8_DEPTH_BACK, mode=Mode.SUBTRACT)


solid = Compound([part.part, body_2_3.part, body_3_2.part])
